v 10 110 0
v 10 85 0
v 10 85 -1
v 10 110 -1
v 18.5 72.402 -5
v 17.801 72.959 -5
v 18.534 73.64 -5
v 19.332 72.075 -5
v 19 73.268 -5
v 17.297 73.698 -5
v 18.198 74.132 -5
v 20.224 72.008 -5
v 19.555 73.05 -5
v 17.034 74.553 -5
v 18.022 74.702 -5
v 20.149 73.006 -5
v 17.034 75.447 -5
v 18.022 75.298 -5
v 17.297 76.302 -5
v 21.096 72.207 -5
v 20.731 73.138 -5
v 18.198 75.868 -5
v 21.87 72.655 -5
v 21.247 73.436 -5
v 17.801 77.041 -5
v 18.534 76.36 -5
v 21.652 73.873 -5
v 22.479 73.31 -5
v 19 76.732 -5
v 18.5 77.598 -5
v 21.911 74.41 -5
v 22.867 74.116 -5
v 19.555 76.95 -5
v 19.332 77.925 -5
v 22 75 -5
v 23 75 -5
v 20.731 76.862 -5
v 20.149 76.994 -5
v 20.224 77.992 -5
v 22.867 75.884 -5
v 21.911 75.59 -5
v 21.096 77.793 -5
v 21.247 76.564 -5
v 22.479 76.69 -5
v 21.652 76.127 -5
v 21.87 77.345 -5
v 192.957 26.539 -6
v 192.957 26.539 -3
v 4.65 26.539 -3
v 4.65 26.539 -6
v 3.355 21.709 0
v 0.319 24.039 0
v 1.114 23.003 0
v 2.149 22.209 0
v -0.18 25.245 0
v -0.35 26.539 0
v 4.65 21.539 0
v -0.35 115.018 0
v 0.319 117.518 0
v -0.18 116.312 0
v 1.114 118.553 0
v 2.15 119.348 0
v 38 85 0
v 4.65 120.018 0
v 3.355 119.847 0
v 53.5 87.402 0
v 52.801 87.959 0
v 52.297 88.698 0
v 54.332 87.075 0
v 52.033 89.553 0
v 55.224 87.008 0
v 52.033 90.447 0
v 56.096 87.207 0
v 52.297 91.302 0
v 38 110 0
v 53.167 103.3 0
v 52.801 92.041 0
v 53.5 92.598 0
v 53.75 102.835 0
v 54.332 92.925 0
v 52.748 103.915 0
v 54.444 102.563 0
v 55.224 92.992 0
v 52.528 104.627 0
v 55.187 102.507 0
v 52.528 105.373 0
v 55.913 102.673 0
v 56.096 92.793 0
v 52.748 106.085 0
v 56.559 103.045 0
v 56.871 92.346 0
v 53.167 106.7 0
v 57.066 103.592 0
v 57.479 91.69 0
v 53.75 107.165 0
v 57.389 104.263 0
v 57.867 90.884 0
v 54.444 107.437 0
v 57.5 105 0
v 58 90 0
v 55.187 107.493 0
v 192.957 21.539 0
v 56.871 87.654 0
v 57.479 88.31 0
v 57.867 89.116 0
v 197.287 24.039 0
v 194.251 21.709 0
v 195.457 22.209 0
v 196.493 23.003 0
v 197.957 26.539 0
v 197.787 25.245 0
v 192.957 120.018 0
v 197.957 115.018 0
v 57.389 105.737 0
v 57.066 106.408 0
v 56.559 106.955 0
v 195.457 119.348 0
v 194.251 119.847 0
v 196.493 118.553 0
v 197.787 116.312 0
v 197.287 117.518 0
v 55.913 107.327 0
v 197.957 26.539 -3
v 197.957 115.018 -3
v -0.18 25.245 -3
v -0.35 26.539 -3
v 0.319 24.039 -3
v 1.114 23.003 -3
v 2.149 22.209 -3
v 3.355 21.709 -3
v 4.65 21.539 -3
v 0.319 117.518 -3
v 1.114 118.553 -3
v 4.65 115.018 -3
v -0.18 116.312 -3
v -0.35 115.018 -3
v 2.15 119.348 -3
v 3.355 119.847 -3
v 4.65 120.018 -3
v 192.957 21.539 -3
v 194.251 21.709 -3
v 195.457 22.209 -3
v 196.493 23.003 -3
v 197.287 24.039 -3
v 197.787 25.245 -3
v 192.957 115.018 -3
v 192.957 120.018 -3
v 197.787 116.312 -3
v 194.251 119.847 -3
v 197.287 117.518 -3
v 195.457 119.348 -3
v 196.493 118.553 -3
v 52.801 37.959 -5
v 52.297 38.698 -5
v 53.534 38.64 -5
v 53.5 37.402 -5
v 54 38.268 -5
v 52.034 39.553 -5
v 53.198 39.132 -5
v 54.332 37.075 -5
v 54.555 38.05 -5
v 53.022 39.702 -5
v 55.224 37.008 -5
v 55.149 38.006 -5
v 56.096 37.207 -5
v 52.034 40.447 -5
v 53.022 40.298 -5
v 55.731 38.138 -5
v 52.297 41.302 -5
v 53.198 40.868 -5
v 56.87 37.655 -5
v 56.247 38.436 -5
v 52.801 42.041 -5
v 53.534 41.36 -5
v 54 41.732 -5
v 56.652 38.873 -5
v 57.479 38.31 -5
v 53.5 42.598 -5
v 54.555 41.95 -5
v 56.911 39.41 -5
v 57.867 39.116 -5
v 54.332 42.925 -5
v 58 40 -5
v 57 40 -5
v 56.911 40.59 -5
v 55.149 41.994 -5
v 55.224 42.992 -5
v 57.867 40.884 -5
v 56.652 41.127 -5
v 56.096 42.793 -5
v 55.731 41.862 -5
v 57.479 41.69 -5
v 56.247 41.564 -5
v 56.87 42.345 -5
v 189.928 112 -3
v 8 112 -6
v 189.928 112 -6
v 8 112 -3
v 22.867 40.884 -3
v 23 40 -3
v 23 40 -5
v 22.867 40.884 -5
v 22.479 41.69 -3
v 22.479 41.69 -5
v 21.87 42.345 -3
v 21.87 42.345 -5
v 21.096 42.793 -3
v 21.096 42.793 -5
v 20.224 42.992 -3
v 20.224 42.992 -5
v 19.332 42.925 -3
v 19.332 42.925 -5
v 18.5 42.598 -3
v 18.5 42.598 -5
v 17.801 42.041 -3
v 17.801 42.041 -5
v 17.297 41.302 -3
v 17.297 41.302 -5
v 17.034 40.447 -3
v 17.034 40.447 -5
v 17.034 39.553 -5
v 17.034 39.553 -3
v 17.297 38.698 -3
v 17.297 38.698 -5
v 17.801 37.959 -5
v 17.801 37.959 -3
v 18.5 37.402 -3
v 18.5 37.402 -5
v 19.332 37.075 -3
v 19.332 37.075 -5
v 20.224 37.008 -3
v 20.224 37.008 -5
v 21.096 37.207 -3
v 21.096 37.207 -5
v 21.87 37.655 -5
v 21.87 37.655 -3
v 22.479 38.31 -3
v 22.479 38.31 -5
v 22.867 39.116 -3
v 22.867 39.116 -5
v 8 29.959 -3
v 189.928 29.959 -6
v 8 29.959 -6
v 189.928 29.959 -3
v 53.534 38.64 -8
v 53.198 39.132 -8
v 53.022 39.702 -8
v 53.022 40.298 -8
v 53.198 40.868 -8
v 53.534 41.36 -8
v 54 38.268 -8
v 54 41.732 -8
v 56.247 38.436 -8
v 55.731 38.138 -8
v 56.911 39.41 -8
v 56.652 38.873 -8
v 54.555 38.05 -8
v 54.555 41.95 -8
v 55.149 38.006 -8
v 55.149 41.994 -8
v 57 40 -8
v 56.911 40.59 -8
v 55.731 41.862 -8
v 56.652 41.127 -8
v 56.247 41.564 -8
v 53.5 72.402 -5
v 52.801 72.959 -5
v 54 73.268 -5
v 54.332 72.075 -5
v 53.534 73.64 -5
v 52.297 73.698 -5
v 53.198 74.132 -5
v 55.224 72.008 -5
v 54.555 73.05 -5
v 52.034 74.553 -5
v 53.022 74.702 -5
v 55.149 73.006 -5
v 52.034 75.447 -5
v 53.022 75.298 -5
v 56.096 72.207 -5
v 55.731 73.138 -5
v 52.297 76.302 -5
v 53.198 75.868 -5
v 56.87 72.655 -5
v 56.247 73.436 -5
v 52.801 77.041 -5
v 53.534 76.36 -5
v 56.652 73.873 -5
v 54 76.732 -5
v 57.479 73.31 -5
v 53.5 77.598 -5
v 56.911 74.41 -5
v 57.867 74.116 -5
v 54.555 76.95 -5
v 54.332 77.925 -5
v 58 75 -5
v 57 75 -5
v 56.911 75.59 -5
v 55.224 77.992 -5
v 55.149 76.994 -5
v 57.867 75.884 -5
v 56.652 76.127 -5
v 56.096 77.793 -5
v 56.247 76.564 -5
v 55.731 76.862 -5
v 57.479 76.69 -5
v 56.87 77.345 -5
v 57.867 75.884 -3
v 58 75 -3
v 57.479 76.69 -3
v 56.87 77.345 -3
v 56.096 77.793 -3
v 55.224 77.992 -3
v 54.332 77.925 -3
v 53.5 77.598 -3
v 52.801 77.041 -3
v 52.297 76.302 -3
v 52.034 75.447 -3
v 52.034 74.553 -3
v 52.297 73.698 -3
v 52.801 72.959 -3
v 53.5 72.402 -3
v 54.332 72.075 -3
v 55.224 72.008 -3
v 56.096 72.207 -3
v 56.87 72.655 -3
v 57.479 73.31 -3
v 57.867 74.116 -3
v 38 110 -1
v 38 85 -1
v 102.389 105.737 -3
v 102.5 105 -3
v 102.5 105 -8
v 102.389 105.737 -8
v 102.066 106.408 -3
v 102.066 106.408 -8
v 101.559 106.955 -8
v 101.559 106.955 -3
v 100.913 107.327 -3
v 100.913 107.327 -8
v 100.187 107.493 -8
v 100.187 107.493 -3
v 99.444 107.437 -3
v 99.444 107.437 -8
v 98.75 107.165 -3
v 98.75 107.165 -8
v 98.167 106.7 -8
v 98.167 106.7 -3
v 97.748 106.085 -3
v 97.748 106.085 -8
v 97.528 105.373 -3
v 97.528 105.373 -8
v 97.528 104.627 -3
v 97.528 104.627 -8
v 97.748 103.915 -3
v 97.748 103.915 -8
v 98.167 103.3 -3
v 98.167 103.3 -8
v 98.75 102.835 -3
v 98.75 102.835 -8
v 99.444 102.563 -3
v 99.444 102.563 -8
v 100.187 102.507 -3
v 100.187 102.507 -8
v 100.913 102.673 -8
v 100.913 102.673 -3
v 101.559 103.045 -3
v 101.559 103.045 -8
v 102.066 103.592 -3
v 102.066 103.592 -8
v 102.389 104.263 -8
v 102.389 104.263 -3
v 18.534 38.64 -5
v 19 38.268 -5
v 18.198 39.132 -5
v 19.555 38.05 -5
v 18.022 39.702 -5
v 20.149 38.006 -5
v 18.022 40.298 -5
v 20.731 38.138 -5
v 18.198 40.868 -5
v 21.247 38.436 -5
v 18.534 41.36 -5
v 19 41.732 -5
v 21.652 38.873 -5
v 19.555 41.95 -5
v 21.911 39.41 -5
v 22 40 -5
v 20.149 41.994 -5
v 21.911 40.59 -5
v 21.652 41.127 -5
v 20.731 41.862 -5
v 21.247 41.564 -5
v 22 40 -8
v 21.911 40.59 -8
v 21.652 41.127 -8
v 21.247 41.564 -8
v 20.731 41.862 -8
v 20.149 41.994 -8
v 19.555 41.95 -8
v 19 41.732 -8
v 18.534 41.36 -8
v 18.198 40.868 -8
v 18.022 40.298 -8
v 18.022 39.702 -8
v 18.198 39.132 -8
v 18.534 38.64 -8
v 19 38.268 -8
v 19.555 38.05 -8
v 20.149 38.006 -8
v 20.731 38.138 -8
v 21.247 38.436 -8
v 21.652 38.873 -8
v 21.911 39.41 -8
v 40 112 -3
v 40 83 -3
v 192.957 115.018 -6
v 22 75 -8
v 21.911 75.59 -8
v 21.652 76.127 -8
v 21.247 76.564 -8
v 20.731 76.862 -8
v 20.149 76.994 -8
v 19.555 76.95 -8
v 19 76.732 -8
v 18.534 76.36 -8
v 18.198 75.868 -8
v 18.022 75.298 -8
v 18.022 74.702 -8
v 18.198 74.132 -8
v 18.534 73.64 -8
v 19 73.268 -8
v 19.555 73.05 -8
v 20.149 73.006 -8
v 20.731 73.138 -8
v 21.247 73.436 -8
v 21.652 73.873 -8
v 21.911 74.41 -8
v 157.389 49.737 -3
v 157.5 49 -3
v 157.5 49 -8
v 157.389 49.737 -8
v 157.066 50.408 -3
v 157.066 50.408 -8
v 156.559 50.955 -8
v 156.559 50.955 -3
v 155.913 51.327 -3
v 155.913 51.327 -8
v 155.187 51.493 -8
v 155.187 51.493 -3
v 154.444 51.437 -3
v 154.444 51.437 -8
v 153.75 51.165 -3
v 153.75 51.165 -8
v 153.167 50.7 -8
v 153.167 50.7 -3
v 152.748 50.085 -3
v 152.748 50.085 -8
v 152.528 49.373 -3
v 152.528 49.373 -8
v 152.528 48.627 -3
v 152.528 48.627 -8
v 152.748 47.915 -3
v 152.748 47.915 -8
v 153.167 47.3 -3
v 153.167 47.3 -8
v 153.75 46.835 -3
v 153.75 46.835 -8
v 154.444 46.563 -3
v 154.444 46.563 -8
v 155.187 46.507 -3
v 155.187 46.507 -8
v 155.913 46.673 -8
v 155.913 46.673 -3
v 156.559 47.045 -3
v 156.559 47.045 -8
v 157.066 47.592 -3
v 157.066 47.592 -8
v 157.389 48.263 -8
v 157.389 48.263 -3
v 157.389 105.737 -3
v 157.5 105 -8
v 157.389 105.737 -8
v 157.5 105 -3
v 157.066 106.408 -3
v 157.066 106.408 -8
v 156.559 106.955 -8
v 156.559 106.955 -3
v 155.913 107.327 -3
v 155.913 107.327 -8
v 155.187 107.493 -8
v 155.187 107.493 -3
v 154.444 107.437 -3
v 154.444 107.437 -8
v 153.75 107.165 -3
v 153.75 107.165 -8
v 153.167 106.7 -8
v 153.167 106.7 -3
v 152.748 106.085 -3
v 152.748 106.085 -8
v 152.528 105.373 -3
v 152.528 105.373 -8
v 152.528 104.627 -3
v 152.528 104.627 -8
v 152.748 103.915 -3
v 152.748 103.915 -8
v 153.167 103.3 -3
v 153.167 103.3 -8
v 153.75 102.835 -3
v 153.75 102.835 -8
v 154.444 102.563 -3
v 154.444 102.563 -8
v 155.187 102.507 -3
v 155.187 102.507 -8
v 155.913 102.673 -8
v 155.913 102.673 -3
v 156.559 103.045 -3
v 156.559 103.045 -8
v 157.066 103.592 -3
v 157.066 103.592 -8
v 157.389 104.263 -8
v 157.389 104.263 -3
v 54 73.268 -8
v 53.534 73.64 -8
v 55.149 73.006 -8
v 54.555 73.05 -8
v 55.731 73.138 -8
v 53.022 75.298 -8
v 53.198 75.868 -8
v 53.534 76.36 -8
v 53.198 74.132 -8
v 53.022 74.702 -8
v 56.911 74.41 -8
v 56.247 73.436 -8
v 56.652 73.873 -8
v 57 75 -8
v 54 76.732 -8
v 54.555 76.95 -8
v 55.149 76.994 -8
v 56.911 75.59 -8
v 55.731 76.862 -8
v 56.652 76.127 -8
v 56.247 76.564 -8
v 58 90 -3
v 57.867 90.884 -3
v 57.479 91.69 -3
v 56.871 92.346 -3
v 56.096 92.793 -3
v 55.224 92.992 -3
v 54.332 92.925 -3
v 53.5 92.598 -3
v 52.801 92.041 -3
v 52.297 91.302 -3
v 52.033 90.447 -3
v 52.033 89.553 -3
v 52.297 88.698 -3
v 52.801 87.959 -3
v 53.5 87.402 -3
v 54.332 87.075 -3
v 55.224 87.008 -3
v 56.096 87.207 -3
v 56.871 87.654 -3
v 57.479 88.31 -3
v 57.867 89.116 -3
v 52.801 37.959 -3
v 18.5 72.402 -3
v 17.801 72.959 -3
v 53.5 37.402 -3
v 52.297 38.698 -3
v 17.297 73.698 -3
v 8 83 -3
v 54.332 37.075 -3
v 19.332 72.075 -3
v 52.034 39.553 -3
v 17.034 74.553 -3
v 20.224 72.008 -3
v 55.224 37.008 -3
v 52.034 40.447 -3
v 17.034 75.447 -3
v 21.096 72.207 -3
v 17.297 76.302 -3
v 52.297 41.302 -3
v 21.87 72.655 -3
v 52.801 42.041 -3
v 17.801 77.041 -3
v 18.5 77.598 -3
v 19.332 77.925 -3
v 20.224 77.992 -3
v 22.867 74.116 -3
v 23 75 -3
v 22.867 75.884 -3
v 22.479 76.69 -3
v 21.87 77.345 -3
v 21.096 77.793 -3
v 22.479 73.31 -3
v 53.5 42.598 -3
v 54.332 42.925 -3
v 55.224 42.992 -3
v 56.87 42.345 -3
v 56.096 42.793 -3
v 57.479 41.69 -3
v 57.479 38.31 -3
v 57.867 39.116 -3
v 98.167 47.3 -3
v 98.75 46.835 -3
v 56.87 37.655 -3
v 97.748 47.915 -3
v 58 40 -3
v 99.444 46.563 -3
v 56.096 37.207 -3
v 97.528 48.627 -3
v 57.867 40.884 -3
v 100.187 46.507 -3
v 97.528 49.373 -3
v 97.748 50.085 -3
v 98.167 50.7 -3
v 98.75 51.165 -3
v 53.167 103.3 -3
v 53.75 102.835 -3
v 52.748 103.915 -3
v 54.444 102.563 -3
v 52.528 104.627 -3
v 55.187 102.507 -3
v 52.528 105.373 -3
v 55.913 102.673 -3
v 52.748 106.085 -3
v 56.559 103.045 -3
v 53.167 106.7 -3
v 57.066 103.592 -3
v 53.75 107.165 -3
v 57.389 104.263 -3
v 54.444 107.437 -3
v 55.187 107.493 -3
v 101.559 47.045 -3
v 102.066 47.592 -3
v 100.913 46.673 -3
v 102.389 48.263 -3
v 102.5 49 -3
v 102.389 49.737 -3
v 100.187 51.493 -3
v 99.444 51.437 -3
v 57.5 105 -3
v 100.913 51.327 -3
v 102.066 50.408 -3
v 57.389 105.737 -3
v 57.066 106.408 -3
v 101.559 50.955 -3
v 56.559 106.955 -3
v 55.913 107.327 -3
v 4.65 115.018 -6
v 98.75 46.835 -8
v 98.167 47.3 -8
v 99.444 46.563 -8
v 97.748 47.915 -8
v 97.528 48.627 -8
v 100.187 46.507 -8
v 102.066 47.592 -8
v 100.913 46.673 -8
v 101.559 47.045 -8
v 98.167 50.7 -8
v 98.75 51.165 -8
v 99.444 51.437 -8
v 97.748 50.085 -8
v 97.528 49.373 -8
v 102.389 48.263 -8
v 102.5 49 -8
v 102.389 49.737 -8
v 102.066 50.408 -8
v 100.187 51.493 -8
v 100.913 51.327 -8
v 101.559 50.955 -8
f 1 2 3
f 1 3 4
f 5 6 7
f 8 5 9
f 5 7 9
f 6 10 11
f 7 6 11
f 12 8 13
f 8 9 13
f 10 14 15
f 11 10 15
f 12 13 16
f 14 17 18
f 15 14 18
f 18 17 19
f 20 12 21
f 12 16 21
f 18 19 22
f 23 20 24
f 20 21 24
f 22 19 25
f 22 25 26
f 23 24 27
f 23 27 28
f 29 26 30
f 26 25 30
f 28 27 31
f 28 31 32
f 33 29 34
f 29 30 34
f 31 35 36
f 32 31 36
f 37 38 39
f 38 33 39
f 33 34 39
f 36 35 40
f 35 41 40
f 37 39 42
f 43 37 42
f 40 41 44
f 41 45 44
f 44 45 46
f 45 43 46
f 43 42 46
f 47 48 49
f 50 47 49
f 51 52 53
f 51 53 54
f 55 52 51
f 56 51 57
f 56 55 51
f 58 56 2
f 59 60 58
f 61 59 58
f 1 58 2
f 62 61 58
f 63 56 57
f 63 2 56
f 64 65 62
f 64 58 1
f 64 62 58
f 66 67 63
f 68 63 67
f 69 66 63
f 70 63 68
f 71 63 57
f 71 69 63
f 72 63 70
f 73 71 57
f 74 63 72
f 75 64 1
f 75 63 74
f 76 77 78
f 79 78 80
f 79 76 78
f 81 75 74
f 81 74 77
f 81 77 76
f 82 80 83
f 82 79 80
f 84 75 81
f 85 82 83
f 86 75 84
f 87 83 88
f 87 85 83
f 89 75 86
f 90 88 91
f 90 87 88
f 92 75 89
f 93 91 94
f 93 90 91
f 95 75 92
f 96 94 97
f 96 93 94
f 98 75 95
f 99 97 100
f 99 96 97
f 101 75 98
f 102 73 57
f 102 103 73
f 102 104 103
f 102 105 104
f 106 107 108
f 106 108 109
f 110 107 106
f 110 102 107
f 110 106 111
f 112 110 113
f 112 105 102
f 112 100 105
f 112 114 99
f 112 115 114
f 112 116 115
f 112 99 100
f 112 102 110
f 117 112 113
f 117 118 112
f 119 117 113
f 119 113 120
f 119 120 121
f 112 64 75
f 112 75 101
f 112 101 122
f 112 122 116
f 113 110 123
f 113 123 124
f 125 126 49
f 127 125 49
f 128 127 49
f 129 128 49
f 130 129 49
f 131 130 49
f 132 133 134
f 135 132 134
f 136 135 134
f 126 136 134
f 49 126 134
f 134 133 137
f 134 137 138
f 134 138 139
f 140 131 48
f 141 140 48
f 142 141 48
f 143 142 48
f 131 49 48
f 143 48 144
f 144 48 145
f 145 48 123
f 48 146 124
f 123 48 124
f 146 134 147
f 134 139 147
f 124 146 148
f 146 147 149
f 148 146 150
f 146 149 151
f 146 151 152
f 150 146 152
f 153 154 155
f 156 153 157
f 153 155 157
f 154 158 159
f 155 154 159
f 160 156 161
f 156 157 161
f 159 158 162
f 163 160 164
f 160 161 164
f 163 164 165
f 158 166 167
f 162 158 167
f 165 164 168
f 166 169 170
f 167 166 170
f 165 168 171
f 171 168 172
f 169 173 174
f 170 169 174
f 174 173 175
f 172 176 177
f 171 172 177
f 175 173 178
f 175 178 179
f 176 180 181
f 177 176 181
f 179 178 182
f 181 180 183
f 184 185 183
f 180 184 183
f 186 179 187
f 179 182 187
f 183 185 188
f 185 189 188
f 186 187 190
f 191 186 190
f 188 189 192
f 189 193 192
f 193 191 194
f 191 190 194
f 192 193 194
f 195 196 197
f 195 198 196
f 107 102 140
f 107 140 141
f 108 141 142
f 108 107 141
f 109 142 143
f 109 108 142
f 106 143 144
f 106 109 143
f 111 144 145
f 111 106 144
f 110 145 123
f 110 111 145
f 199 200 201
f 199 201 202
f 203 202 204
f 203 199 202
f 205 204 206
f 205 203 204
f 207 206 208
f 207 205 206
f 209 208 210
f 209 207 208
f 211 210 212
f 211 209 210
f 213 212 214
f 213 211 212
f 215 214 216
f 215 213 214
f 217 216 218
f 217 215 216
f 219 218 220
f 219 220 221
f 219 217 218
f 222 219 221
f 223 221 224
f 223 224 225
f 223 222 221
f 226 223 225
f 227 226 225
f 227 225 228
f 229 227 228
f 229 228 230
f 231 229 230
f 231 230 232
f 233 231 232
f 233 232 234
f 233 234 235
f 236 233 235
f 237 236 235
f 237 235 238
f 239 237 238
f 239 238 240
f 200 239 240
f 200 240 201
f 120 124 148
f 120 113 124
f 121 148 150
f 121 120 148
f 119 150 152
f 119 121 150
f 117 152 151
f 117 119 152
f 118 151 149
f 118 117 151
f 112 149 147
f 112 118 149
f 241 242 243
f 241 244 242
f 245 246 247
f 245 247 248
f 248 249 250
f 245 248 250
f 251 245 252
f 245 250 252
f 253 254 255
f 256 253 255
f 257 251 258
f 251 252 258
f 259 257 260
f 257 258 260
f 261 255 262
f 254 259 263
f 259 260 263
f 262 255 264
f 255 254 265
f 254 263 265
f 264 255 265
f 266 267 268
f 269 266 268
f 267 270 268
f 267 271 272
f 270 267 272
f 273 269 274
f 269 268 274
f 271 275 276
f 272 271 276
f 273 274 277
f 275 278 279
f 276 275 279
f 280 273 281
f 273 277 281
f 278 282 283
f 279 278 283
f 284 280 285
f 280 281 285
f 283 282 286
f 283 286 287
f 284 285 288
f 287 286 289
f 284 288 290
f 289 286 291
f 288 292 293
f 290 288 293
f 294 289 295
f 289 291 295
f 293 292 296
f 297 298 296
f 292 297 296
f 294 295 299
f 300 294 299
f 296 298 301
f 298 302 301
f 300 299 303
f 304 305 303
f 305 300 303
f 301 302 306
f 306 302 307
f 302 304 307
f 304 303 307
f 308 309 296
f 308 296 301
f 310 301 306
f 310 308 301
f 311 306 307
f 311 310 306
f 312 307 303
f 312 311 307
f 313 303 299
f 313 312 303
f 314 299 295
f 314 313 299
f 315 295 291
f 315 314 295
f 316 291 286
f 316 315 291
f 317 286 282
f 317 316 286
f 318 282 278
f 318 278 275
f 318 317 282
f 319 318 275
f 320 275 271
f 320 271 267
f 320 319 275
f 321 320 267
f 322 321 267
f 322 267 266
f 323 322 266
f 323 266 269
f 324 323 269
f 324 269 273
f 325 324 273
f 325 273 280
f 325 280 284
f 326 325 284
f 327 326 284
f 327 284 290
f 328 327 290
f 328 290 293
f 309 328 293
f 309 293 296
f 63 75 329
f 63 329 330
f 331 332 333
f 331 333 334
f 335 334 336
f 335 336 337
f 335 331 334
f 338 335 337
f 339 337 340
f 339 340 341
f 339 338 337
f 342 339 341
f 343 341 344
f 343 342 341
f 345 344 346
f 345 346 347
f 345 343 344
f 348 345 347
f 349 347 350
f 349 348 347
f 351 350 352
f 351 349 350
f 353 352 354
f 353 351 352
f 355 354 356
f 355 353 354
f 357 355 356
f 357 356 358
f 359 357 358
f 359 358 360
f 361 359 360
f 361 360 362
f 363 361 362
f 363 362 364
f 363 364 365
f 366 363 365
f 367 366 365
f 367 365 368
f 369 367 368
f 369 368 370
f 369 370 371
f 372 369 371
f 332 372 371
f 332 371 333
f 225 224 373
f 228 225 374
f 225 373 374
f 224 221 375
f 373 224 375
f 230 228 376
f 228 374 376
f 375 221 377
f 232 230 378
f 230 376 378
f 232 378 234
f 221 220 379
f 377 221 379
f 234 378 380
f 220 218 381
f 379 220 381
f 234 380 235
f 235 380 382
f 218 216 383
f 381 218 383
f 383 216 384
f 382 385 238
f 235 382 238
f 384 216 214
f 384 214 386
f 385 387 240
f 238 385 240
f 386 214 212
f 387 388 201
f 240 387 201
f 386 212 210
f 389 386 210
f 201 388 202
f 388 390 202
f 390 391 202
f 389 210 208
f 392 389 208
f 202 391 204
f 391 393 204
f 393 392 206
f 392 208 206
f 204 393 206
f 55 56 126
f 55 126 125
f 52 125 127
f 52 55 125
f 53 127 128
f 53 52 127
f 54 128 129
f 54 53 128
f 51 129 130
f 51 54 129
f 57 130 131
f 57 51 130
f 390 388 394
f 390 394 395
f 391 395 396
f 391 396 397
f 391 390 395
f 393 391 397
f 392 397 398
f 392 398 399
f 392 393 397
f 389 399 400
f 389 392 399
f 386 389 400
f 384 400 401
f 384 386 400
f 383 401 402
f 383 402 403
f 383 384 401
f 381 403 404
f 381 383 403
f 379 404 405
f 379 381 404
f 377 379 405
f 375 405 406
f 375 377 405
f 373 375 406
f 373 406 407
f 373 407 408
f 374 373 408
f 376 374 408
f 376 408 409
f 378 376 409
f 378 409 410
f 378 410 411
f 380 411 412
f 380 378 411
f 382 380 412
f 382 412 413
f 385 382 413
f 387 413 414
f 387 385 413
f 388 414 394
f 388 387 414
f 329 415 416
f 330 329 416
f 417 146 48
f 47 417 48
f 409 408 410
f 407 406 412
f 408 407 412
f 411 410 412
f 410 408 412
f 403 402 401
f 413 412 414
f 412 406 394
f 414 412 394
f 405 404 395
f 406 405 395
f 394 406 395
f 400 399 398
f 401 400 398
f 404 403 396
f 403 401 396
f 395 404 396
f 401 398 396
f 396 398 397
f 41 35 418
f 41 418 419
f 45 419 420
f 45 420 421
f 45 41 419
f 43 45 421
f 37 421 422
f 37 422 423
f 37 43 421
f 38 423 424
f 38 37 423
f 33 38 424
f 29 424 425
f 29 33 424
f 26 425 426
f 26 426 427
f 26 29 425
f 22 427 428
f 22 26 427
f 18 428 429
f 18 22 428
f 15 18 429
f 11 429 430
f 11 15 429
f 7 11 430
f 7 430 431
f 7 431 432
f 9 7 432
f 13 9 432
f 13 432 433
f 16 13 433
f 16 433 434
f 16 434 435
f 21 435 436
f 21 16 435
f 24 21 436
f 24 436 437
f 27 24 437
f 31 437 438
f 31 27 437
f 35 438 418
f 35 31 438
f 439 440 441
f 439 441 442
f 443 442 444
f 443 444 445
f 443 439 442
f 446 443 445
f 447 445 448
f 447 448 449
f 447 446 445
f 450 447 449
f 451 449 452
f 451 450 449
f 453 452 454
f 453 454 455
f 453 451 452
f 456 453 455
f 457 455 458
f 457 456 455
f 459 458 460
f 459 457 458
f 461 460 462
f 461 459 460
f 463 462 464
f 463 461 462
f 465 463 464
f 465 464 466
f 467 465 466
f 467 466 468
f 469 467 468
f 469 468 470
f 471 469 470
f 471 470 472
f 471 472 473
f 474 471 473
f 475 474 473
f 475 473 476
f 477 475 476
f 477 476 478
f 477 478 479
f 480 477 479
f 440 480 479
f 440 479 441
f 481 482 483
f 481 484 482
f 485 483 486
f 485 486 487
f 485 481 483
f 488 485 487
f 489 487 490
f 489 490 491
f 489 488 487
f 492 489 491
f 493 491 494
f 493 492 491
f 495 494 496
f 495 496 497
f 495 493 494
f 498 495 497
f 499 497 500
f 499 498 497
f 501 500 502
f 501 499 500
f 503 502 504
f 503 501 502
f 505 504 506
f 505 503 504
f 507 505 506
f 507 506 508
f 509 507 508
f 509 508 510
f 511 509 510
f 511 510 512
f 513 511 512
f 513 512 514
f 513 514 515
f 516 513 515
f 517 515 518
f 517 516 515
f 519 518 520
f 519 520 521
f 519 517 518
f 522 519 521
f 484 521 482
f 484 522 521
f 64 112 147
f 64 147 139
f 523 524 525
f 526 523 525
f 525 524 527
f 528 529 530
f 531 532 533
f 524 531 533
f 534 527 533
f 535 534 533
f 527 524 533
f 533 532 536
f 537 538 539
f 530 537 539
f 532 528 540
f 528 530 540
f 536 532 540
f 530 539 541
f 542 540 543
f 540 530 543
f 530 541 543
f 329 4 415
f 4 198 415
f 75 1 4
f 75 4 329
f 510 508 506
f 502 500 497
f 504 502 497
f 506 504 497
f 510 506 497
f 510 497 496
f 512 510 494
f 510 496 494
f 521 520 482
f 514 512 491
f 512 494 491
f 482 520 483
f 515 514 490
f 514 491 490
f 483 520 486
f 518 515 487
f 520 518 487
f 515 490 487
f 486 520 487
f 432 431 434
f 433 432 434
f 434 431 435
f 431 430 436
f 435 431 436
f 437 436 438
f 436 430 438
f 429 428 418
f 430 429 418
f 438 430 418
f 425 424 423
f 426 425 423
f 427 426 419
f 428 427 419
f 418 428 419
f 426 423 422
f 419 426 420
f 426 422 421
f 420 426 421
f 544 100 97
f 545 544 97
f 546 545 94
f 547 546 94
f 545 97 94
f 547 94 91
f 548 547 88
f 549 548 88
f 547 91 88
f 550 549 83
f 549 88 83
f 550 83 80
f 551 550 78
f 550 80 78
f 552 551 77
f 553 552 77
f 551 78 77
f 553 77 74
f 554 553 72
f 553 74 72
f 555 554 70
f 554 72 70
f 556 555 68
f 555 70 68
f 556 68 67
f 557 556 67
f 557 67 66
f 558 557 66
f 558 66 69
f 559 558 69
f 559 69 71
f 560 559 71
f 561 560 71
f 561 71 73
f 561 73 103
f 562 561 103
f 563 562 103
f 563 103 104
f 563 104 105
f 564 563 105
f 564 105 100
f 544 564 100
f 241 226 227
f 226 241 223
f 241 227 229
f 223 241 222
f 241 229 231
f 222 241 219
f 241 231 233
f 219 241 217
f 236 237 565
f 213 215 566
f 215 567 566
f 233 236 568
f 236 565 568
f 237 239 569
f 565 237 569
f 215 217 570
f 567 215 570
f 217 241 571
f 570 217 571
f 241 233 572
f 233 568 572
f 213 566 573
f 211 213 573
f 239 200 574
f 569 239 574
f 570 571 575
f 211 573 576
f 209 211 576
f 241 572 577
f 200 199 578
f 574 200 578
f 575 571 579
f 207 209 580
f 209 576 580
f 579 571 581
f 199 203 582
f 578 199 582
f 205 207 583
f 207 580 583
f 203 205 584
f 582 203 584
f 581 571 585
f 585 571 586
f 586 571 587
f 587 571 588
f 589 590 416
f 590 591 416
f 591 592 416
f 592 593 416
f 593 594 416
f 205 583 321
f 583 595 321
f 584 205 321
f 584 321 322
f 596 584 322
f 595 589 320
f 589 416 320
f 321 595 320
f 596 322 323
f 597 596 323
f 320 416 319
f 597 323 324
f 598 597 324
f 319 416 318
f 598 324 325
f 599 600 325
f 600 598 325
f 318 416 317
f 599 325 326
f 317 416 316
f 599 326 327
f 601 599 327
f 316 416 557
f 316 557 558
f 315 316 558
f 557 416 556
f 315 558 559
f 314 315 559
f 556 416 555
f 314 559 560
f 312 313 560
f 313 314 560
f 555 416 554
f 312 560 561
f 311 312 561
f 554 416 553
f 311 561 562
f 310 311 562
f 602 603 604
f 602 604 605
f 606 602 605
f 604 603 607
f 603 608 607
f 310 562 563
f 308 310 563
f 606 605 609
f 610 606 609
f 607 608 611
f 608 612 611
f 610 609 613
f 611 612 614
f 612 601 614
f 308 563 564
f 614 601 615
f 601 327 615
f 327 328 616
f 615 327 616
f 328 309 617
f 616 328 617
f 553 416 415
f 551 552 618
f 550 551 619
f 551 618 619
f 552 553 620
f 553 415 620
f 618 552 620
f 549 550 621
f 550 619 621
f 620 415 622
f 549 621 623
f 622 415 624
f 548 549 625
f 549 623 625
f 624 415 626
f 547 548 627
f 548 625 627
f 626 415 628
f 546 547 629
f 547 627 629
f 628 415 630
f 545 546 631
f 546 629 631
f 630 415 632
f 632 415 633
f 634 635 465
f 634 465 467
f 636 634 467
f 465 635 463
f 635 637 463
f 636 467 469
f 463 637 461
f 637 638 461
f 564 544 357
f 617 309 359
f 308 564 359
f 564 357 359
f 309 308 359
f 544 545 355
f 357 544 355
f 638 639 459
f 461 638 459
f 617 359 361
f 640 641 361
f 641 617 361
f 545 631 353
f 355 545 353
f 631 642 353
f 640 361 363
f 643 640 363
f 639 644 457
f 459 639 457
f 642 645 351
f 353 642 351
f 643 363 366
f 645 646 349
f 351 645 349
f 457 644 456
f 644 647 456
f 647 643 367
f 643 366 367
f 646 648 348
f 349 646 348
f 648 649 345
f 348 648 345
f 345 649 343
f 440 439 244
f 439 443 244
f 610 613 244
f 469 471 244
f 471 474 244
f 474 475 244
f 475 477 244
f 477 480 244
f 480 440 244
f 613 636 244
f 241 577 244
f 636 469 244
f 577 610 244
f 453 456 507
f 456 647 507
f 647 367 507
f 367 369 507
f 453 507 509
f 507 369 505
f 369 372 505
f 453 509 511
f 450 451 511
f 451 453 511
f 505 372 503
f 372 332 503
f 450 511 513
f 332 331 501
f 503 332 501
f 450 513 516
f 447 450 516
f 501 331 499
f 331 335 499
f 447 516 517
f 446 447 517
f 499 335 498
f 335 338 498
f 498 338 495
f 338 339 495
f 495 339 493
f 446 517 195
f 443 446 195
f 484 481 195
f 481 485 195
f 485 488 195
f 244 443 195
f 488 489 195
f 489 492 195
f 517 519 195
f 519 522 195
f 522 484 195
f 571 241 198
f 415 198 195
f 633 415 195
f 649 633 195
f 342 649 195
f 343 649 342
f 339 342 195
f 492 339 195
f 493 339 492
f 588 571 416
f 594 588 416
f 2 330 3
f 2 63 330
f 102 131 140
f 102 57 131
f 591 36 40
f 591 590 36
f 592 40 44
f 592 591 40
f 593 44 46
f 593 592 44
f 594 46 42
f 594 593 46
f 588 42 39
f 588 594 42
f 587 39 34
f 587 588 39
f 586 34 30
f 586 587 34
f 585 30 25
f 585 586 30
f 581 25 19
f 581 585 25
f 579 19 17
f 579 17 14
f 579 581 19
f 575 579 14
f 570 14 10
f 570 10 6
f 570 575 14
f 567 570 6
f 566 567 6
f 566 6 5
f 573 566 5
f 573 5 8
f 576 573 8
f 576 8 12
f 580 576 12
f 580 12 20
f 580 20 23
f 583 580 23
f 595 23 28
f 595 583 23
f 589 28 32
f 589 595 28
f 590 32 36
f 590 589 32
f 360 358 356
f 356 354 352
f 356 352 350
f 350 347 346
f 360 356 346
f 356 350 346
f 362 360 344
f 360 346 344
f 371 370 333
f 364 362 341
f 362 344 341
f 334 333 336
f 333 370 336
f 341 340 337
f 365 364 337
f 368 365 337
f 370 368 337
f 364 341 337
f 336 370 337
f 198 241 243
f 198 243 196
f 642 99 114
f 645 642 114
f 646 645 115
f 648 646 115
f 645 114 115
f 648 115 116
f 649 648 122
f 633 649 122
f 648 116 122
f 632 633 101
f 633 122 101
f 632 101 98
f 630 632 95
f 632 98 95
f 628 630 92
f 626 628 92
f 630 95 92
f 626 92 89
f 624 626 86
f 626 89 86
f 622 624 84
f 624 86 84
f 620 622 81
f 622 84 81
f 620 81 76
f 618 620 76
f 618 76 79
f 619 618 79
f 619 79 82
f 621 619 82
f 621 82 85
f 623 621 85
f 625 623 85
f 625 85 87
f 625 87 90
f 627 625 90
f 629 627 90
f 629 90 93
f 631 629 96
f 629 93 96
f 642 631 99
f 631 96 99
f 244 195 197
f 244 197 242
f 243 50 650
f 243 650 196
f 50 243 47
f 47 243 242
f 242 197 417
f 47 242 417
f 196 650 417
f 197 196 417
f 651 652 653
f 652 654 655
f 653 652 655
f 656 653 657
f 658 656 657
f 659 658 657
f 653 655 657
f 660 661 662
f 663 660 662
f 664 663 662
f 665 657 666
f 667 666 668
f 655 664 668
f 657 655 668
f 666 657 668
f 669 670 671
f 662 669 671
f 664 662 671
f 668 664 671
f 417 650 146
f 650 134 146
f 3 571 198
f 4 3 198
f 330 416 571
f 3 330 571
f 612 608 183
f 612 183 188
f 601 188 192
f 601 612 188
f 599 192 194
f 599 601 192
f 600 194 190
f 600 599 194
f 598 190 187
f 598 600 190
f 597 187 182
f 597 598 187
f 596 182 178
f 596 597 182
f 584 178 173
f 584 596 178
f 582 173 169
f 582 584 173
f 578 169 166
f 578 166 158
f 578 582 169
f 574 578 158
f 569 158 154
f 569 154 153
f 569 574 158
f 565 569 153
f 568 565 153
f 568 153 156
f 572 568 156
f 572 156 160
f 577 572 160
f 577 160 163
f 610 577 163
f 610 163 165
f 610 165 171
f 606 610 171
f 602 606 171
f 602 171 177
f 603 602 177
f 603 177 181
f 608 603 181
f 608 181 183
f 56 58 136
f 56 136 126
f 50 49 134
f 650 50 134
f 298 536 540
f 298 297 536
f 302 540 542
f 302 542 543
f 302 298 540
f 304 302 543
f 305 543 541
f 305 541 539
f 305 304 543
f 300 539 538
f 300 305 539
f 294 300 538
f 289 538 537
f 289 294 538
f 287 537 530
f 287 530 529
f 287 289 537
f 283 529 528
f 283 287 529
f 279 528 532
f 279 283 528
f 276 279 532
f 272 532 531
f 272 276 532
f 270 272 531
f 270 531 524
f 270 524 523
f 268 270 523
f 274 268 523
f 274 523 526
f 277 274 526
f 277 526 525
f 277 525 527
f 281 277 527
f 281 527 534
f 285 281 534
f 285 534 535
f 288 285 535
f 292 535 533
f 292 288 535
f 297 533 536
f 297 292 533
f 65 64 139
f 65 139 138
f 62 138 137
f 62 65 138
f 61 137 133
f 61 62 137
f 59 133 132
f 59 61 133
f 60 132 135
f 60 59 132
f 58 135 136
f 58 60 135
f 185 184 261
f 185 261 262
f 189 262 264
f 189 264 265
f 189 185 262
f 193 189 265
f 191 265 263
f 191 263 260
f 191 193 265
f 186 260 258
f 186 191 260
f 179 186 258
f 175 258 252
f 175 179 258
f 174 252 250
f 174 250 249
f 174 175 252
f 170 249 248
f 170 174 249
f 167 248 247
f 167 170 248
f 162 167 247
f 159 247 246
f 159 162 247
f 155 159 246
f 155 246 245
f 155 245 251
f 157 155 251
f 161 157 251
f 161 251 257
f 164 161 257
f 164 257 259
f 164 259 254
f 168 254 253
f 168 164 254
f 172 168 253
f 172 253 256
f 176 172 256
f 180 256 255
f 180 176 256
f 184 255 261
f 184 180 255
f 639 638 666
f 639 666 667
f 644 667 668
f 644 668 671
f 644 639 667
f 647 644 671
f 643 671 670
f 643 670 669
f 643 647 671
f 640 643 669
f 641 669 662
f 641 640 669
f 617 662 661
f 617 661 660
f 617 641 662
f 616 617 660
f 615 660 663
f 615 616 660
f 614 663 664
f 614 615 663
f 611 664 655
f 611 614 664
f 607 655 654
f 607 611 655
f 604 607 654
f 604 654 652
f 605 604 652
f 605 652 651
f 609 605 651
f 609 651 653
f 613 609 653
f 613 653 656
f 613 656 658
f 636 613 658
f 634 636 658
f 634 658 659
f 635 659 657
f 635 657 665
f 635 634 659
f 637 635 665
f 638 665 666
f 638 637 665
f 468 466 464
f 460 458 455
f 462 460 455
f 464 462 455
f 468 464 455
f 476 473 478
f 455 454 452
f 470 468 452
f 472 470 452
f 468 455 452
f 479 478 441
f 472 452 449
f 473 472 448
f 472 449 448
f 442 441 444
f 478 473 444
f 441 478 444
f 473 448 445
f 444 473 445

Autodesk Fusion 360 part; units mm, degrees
sketch "Sketch1" plane through (0, 0, 0) normal (0, 0, 1) x (1, 0, 0)
  line L0 (4.6495, 21.5388) -> (192.9573, 21.5388)
  line L1 (197.9573, 26.5388) -> (197.9573, 115.0177)
  line L2 (192.9573, 120.0177) -> (4.6495, 120.0177)
  line L3 (-0.3505, 115.0177) -> (-0.3505, 26.5388)
  line L4 (10, 110) -> (38, 110)
  line L5 (38, 110) -> (38, 85)
  line L6 (38, 85) -> (10, 85)
  line L7 (10, 85) -> (10, 110)
  circle A0 centre (55, 105) radius 2.5
  circle A1 centre (55, 90) radius 3.0001
  circle A2 centre (100, 105) radius 2.5
  circle A3 centre (100, 49) radius 2.5
  circle A4 centre (155, 105) radius 2.5
  circle A5 centre (155, 49) radius 2.5
  arc A6 (4.6495, 120.0177) -> (-0.3505, 115.0177) centre (4.6495, 115.0177) ccw
  arc A7 (197.9573, 115.0177) -> (192.9573, 120.0177) centre (192.9573, 115.0177) ccw
  arc A8 (192.9573, 21.5388) -> (197.9573, 26.5388) centre (192.9573, 26.5388) ccw
  arc A9 (-0.3505, 26.5388) -> (4.6495, 21.5388) centre (4.6495, 26.5388) ccw
  line L8 (4.6495, 115.0177) -> (192.9573, 115.0177)
  line L9 (192.9573, 115.0177) -> (192.9573, 26.5388)
  line L10 (192.9573, 26.5388) -> (4.6495, 26.5388)
  line L11 (4.6495, 26.5388) -> (4.6495, 115.0177)
  line L12 (8, 112) -> (189.9275, 112)
  line L13 (189.9275, 112) -> (189.9275, 29.9593)
  line L14 (189.9275, 29.9593) -> (8, 29.9593)
  line L15 (8, 29.9593) -> (8, 112)
  circle A10 centre (20, 40) radius 2
  circle A11 centre (20, 40) radius 3
  circle A12 centre (20, 75) radius 2
  circle A13 centre (20, 75) radius 3
  circle A14 centre (55, 40) radius 2
  circle A15 centre (55, 40) radius 3
  circle A16 centre (55, 75) radius 2
  circle A17 centre (55, 75) radius 3
  dimension "d1" = 5
  dimension "d2" = 6.0002
  dimension "d3" = 5
  dimension "d4" = 5
  dimension "d5" = 5
  dimension "d6" = 5
  dimension "d7" = 5
extrude "Extrude8" add sketch "Sketch1" against normal blind 3 contours L0 L1 L2 L3 A6 A7 A8 A9 | L12 L13 L14 L15 makes body 1 at (67.4187, 23.2054, 0) makes body 2 at (118.9226, 85.7441, 0)
extrude "Extrude9" add sketch "Sketch1" against normal blind 6 contours L8 L9 L10 L11 bodies 1 2
extrude "Extrude10" add sketch "Sketch1" against normal blind 5 contours A11 | A13 | A15 | A17 bodies 1
extrude "Extrude11" add sketch "Sketch1" against normal blind 8 contours A10 | A12 | A14 | A16 bodies 1
extrude "Extrude12" add sketch "Sketch1" against normal blind 8 contours A2 | A3 | A4 | A5 bodies 1
chamfer "Chamfer4" distance 2 angle 45 1 edges at (10, 97.5, -3) on bodies 1
chamfer "Chamfer5" distance 2 angle 45 1 edges at (23, 110, -3) on bodies 1
chamfer "Chamfer6" distance 2 angle 45 1 edges at (38, 98.5, -3) on bodies 1
chamfer "Chamfer7" distance 2 angle 45 1 edges at (24, 85, -3) on bodies 1
